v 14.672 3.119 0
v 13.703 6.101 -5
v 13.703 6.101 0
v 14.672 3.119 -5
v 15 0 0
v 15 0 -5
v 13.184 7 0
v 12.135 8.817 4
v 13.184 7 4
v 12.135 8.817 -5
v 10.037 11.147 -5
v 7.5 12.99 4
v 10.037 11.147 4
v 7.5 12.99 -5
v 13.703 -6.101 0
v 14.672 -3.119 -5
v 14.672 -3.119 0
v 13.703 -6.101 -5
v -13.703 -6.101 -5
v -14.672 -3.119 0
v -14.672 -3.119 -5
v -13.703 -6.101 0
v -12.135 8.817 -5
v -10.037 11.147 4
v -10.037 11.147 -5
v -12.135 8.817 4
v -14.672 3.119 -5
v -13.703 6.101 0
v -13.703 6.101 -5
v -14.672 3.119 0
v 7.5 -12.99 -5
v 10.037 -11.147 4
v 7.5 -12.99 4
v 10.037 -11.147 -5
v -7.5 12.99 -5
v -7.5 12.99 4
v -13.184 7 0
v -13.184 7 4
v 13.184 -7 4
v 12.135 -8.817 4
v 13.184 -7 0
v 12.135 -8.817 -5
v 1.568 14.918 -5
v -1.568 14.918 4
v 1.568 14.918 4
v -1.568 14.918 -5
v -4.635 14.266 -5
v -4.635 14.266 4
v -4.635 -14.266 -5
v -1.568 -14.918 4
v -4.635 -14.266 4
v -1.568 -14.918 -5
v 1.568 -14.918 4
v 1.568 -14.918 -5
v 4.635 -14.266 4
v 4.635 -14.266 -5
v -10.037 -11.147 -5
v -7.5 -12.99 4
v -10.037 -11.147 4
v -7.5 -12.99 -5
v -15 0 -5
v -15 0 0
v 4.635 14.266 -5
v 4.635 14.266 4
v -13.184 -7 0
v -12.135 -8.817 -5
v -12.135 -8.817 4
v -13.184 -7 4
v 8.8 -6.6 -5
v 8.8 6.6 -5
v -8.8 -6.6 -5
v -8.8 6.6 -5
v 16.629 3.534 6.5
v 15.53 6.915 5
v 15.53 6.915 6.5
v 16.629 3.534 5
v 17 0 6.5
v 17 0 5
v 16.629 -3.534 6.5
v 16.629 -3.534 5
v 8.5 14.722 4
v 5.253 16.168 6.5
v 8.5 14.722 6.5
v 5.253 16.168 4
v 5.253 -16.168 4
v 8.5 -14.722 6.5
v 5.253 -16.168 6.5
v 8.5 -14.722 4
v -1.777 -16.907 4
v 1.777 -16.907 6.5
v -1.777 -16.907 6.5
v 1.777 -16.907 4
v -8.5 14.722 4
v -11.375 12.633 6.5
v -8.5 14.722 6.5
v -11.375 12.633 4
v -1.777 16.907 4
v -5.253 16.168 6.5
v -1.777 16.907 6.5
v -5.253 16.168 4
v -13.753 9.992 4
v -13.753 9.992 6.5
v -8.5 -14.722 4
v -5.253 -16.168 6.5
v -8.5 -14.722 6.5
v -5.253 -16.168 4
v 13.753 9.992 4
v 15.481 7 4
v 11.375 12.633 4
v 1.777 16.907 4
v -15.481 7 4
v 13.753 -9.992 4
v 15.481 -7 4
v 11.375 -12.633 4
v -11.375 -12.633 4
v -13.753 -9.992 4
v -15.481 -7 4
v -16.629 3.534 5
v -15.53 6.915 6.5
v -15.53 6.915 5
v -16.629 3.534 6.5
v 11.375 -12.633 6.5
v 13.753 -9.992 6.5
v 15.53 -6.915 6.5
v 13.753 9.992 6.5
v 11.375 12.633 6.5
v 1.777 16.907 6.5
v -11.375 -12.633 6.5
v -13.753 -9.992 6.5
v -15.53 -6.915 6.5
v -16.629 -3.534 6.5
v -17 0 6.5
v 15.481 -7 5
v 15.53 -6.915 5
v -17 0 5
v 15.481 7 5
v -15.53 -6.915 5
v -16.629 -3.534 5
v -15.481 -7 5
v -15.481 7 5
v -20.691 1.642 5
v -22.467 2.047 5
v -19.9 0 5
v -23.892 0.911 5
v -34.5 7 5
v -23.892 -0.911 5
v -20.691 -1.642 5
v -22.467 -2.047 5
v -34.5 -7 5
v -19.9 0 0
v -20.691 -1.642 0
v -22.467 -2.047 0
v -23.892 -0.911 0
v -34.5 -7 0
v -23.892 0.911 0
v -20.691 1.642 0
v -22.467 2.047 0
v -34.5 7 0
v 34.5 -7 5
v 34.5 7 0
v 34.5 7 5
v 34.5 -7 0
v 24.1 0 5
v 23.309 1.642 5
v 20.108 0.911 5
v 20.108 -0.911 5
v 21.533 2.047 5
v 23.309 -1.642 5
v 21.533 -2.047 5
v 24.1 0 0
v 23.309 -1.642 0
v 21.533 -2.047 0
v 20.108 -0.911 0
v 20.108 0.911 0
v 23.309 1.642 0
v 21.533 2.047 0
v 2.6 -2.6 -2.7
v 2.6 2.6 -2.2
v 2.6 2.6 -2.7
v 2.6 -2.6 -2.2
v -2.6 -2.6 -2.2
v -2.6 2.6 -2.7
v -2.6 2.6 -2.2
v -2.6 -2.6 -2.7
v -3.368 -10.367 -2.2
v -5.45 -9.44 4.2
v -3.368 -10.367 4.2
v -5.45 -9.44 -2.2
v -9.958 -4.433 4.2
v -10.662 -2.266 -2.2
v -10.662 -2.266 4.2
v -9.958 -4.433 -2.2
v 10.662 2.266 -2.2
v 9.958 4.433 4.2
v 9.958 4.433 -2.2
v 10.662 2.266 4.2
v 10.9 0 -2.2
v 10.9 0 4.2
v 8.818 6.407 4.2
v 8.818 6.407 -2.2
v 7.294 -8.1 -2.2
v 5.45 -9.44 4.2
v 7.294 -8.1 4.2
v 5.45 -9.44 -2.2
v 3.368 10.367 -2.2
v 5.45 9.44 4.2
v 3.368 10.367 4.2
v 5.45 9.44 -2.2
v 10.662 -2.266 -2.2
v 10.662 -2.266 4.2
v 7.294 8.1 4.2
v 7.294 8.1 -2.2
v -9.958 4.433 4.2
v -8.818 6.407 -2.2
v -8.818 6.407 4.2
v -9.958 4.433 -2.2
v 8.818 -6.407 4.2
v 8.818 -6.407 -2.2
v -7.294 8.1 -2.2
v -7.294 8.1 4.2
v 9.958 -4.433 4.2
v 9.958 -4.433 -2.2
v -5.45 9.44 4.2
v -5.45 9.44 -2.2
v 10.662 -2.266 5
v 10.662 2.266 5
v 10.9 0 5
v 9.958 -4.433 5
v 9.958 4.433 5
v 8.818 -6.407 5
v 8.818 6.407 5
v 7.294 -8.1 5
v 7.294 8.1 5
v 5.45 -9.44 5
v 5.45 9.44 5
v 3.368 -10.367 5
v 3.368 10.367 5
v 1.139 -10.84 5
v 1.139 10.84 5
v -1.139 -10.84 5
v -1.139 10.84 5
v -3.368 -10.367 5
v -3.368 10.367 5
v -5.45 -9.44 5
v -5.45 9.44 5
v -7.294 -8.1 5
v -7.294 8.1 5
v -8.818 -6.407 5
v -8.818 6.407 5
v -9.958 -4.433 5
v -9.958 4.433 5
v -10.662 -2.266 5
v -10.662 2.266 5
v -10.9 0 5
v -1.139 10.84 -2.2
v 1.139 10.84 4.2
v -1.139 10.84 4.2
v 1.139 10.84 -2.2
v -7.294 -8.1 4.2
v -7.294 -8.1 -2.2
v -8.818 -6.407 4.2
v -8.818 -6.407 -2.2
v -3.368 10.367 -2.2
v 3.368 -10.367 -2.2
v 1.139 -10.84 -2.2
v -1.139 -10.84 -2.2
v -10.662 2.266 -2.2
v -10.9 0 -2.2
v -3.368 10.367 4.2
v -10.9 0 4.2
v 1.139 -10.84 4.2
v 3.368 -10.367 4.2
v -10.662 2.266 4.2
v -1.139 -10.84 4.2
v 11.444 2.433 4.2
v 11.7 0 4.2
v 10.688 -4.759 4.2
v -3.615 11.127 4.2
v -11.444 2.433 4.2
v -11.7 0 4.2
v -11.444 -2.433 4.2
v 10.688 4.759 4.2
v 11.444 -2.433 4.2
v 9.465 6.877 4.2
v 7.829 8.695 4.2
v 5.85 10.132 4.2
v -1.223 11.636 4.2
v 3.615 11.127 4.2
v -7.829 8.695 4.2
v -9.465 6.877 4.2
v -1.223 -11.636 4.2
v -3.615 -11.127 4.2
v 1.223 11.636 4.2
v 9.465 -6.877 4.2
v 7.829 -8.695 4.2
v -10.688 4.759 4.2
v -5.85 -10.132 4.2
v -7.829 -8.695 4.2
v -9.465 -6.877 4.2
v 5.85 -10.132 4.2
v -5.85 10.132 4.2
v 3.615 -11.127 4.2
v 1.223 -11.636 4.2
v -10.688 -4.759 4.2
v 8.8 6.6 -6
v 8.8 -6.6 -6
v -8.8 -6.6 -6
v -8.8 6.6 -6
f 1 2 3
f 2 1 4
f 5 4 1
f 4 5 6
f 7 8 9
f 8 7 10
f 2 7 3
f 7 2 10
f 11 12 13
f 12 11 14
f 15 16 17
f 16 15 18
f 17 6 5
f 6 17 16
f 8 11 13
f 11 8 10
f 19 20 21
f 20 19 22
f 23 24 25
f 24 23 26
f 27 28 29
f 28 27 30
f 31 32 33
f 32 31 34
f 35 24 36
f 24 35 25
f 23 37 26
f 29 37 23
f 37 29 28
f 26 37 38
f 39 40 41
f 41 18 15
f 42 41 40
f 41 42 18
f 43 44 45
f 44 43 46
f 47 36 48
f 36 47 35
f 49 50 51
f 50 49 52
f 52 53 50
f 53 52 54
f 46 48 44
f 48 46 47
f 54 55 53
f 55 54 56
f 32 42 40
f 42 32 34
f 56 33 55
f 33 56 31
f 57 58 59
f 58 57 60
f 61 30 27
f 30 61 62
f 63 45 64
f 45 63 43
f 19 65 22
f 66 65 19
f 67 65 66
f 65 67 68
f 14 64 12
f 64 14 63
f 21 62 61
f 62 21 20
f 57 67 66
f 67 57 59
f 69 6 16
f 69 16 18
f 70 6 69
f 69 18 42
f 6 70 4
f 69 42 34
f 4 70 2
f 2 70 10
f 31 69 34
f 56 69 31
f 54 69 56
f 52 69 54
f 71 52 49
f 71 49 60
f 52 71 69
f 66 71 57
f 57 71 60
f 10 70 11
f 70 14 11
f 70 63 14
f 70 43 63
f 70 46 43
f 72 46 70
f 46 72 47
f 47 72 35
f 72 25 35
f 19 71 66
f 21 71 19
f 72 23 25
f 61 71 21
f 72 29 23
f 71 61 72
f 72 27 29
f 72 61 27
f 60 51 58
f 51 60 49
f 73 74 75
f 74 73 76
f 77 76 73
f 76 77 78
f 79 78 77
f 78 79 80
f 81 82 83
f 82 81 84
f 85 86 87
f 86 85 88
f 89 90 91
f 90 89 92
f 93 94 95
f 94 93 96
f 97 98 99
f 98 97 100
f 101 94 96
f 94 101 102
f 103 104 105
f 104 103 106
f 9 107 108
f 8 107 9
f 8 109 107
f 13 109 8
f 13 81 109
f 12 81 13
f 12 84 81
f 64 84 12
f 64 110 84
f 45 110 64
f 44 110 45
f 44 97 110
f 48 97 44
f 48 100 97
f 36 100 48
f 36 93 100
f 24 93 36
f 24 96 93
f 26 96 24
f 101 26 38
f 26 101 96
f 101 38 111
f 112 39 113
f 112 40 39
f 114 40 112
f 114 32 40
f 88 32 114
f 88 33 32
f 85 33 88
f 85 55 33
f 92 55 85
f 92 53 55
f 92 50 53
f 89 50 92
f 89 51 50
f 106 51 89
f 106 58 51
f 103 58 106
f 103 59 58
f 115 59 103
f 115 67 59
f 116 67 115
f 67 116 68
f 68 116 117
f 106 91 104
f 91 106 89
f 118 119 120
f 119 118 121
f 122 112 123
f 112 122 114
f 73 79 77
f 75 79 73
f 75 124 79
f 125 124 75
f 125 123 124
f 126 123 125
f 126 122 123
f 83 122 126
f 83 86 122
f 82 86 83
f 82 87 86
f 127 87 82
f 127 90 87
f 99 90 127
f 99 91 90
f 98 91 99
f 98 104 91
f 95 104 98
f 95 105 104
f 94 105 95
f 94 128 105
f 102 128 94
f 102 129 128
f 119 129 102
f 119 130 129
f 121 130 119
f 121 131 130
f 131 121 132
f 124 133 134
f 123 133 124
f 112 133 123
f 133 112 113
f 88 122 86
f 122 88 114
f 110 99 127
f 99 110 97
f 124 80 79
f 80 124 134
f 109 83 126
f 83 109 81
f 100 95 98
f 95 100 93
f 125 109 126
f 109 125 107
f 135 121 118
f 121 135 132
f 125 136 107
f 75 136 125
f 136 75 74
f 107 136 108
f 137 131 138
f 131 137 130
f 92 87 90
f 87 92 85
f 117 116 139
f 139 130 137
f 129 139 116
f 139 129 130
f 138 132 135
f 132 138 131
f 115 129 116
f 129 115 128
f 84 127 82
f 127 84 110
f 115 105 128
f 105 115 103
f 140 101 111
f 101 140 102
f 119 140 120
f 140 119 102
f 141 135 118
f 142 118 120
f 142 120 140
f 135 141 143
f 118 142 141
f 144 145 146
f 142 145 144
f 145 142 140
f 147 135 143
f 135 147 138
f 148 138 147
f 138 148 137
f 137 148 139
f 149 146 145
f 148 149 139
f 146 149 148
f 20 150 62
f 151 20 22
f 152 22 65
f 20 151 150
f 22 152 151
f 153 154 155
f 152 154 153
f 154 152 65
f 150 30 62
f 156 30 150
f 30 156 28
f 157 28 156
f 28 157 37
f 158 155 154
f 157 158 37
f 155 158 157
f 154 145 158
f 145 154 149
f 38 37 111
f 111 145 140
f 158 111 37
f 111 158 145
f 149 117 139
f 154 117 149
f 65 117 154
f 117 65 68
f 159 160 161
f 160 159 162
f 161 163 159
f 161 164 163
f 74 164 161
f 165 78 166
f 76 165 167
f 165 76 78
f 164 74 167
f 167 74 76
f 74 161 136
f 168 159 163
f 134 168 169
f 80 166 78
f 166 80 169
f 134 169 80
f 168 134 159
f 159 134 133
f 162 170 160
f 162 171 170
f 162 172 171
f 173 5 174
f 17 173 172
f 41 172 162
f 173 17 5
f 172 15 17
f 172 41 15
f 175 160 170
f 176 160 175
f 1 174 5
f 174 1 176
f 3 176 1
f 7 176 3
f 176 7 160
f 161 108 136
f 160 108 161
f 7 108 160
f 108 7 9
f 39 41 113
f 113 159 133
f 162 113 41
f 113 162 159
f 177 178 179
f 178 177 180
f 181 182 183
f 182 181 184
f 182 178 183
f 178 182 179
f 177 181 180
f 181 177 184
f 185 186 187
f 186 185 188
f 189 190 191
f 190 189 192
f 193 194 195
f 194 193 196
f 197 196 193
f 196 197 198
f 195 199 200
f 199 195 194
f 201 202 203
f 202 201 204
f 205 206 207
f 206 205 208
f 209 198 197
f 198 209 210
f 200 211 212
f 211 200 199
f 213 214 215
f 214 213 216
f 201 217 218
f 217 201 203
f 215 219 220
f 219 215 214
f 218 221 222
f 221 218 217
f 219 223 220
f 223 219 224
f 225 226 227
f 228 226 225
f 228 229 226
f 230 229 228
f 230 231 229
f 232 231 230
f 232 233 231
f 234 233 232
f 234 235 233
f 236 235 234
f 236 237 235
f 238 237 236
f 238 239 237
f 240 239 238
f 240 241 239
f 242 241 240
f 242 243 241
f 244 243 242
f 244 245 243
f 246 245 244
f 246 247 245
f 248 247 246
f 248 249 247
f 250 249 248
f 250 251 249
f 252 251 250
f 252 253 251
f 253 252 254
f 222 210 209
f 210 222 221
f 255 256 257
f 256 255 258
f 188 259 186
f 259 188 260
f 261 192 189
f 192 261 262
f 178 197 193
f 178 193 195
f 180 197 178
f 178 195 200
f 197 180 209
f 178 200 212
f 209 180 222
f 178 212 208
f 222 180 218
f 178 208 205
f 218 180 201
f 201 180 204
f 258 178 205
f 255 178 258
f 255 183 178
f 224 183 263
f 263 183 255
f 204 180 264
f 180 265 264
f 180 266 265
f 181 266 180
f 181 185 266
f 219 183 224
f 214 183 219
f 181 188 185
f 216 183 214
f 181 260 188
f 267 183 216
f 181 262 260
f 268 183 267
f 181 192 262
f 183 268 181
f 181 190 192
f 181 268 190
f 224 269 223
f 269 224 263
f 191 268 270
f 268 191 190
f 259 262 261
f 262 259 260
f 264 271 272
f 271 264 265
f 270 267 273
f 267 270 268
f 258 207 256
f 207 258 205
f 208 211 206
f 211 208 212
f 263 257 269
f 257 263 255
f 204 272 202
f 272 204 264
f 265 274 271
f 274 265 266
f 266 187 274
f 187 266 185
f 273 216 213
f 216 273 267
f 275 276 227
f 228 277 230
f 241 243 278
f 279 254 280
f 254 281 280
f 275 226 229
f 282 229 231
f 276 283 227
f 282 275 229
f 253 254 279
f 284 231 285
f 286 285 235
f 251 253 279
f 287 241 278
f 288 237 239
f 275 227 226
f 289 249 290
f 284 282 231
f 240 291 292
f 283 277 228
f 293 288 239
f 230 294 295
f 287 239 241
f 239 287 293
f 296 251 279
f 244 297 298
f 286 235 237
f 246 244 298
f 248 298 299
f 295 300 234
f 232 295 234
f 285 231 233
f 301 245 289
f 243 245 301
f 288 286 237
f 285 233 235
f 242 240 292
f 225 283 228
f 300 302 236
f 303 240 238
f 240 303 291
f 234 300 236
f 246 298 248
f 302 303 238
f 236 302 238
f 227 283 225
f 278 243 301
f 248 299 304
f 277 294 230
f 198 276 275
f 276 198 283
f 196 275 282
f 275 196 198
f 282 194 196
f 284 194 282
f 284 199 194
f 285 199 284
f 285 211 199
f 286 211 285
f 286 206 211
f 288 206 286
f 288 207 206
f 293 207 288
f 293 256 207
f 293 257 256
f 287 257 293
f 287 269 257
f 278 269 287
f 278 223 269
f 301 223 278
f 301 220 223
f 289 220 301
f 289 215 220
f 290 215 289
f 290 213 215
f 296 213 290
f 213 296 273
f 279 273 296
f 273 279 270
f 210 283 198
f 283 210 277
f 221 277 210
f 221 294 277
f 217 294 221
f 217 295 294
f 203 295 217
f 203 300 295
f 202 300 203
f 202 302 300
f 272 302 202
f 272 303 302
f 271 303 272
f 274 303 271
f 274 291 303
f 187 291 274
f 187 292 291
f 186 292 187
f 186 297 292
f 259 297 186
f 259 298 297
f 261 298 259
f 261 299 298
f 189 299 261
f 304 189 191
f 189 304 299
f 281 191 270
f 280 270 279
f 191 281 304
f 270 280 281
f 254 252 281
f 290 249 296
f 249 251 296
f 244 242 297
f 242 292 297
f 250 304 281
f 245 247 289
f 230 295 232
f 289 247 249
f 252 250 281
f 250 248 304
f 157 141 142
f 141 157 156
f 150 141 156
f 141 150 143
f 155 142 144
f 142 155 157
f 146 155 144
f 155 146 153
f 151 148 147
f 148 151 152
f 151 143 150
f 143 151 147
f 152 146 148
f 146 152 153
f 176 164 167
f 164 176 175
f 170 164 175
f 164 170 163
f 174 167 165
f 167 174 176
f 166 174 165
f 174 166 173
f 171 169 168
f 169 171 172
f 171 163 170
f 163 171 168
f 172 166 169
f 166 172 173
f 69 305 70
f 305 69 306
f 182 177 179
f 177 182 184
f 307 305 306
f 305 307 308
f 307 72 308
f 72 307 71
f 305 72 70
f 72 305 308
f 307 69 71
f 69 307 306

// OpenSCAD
// Parameters
seat_width = 22.0; //[11.0:44.0:0.1]
bearing_od_mm = 22.0; //[11.0:44.0:0.1]
bearing_id_mm = 8.0; //[4.0:16.0:0.1]
bearing_width_mm = 7.0; //[3.5:14.0:0.1]
print_clearance_mm = 0.2; //[0.0:0.6:0.05]
interference_fit_mm = 0.2; //[0.0:0.5:0.05]
housing_outer_diameter_mm = 30.0; //[15.0:60.0:0.1]
housing_body_length_mm = 10.0; //[5.0:20.0:0.1]
flange_outer_diameter_mm = 34.0; //[17.0:68.0:0.1]
flange_thickness_mm = 2.5; //[1.25:5.0:0.05]
seat_diameter_mm = 21.8; //[10.9:43.6:0.05]
seat_depth_mm = 7.2; //[3.6:14.4:0.1]
ear_thickness_mm = 5.0; //[2.5:10.0:0.1]
ear_radial_extension_mm = 10.0; //[5.0:20.0:0.1]
ear_width_mm = 14.0; //[7.0:28.0:0.1]
mount_hole_diameter_mm = 4.2; //[2.0:8.0:0.1]
mount_hole_center_distance_mm = 44.0; //[22.0:88.0:0.1]
chamfer_mm = 0.8; //[0.0:2.0:0.05]
overlap_mm = 1.0; //[0.5:2.0:0.1]
press_fit_feature_w_mm = 5.0; //[2.5:10.0:0.1]
press_fit_feature_h_mm = 6.0; //[3.0:12.0:0.1]

// Base Shapes
module bearing_housing_body_cyl() {
  cylinder(r=housing_outer_diameter_mm/2, h=housing_body_length_mm, center=true);
}

module axial_flange_cyl() {
  translate([0, 0, housing_body_length_mm/2 + flange_thickness_mm/2 - overlap_mm])
    cylinder(r=flange_outer_diameter_mm/2, h=flange_thickness_mm, center=true);
}

module mounting_ear_box() {
  cube([ear_radial_extension_mm + (housing_outer_diameter_mm/2), ear_width_mm, ear_thickness_mm], center=true);
}

module bearing_press_fit_seat_cyl() {
  translate([0, 0, housing_body_length_mm/2 - seat_depth_mm/2])
    cylinder(r=seat_diameter_mm/2, h=seat_depth_mm, center=true);
}

module lead_in_chamfer_cone() {
  translate([0, 0, housing_body_length_mm/2 - chamfer_mm/2])
    cylinder(r1=seat_diameter_mm/2 + chamfer_mm, r2=seat_diameter_mm/2, h=chamfer_mm, center=true);
}

module mount_hole_cyl() {
  cylinder(r=mount_hole_diameter_mm/2, h=ear_thickness_mm + 2*overlap_mm, center=true);
}

module press_fit_peg_box() {
  translate([0, 0, -housing_body_length_mm/2 - press_fit_feature_h_mm/2 + overlap_mm])
    cube([press_fit_feature_w_mm + interference_fit_mm, press_fit_feature_w_mm + interference_fit_mm, press_fit_feature_h_mm], center=true);
}

module press_fit_socket_box() {
  translate([0, 0, -housing_body_length_mm/2 + overlap_mm])
    cube([press_fit_feature_w_mm + print_clearance_mm, press_fit_feature_w_mm + print_clearance_mm, 2*(press_fit_feature_h_mm + overlap_mm)], center=true);
}

module mt3608_carrier_placeholder() {
  translate([0, 0, -housing_body_length_mm/2 + (seat_width*0.15)/2 - overlap_mm])
    cube([seat_width*0.8, seat_width*0.6, seat_width*0.15], center=true);
}

// Operations
module bearing_housing_body_with_flange() {
  union() {
    bearing_housing_body_cyl();
    axial_flange_cyl();
  }
}

module mounting_ears_pair() {
  union() {
    translate([-mount_hole_center_distance_mm/2, 0, housing_body_length_mm/2 - ear_thickness_mm/2])
      mounting_ear_box();
    translate([mount_hole_center_distance_mm/2, 0, housing_body_length_mm/2 - ear_thickness_mm/2])
      mounting_ear_box();
  }
}

module housing_plus_ears() {
  union() {
    bearing_housing_body_with_flange();
    mounting_ears_pair();
    press_fit_peg_box();
  }
}

module housing_with_cuts() {
  difference() {
    housing_plus_ears();
    bearing_press_fit_seat_cyl();
    lead_in_chamfer_cone();
    translate([-mount_hole_center_distance_mm/2, 0, housing_body_length_mm/2 - ear_thickness_mm/2])
      mount_hole_cyl();
    translate([mount_hole_center_distance_mm/2, 0, housing_body_length_mm/2 - ear_thickness_mm/2])
      mount_hole_cyl();
    press_fit_socket_box();
  }
}

// Final Output
union() {
  housing_with_cuts();
  mt3608_carrier_placeholder();
}
